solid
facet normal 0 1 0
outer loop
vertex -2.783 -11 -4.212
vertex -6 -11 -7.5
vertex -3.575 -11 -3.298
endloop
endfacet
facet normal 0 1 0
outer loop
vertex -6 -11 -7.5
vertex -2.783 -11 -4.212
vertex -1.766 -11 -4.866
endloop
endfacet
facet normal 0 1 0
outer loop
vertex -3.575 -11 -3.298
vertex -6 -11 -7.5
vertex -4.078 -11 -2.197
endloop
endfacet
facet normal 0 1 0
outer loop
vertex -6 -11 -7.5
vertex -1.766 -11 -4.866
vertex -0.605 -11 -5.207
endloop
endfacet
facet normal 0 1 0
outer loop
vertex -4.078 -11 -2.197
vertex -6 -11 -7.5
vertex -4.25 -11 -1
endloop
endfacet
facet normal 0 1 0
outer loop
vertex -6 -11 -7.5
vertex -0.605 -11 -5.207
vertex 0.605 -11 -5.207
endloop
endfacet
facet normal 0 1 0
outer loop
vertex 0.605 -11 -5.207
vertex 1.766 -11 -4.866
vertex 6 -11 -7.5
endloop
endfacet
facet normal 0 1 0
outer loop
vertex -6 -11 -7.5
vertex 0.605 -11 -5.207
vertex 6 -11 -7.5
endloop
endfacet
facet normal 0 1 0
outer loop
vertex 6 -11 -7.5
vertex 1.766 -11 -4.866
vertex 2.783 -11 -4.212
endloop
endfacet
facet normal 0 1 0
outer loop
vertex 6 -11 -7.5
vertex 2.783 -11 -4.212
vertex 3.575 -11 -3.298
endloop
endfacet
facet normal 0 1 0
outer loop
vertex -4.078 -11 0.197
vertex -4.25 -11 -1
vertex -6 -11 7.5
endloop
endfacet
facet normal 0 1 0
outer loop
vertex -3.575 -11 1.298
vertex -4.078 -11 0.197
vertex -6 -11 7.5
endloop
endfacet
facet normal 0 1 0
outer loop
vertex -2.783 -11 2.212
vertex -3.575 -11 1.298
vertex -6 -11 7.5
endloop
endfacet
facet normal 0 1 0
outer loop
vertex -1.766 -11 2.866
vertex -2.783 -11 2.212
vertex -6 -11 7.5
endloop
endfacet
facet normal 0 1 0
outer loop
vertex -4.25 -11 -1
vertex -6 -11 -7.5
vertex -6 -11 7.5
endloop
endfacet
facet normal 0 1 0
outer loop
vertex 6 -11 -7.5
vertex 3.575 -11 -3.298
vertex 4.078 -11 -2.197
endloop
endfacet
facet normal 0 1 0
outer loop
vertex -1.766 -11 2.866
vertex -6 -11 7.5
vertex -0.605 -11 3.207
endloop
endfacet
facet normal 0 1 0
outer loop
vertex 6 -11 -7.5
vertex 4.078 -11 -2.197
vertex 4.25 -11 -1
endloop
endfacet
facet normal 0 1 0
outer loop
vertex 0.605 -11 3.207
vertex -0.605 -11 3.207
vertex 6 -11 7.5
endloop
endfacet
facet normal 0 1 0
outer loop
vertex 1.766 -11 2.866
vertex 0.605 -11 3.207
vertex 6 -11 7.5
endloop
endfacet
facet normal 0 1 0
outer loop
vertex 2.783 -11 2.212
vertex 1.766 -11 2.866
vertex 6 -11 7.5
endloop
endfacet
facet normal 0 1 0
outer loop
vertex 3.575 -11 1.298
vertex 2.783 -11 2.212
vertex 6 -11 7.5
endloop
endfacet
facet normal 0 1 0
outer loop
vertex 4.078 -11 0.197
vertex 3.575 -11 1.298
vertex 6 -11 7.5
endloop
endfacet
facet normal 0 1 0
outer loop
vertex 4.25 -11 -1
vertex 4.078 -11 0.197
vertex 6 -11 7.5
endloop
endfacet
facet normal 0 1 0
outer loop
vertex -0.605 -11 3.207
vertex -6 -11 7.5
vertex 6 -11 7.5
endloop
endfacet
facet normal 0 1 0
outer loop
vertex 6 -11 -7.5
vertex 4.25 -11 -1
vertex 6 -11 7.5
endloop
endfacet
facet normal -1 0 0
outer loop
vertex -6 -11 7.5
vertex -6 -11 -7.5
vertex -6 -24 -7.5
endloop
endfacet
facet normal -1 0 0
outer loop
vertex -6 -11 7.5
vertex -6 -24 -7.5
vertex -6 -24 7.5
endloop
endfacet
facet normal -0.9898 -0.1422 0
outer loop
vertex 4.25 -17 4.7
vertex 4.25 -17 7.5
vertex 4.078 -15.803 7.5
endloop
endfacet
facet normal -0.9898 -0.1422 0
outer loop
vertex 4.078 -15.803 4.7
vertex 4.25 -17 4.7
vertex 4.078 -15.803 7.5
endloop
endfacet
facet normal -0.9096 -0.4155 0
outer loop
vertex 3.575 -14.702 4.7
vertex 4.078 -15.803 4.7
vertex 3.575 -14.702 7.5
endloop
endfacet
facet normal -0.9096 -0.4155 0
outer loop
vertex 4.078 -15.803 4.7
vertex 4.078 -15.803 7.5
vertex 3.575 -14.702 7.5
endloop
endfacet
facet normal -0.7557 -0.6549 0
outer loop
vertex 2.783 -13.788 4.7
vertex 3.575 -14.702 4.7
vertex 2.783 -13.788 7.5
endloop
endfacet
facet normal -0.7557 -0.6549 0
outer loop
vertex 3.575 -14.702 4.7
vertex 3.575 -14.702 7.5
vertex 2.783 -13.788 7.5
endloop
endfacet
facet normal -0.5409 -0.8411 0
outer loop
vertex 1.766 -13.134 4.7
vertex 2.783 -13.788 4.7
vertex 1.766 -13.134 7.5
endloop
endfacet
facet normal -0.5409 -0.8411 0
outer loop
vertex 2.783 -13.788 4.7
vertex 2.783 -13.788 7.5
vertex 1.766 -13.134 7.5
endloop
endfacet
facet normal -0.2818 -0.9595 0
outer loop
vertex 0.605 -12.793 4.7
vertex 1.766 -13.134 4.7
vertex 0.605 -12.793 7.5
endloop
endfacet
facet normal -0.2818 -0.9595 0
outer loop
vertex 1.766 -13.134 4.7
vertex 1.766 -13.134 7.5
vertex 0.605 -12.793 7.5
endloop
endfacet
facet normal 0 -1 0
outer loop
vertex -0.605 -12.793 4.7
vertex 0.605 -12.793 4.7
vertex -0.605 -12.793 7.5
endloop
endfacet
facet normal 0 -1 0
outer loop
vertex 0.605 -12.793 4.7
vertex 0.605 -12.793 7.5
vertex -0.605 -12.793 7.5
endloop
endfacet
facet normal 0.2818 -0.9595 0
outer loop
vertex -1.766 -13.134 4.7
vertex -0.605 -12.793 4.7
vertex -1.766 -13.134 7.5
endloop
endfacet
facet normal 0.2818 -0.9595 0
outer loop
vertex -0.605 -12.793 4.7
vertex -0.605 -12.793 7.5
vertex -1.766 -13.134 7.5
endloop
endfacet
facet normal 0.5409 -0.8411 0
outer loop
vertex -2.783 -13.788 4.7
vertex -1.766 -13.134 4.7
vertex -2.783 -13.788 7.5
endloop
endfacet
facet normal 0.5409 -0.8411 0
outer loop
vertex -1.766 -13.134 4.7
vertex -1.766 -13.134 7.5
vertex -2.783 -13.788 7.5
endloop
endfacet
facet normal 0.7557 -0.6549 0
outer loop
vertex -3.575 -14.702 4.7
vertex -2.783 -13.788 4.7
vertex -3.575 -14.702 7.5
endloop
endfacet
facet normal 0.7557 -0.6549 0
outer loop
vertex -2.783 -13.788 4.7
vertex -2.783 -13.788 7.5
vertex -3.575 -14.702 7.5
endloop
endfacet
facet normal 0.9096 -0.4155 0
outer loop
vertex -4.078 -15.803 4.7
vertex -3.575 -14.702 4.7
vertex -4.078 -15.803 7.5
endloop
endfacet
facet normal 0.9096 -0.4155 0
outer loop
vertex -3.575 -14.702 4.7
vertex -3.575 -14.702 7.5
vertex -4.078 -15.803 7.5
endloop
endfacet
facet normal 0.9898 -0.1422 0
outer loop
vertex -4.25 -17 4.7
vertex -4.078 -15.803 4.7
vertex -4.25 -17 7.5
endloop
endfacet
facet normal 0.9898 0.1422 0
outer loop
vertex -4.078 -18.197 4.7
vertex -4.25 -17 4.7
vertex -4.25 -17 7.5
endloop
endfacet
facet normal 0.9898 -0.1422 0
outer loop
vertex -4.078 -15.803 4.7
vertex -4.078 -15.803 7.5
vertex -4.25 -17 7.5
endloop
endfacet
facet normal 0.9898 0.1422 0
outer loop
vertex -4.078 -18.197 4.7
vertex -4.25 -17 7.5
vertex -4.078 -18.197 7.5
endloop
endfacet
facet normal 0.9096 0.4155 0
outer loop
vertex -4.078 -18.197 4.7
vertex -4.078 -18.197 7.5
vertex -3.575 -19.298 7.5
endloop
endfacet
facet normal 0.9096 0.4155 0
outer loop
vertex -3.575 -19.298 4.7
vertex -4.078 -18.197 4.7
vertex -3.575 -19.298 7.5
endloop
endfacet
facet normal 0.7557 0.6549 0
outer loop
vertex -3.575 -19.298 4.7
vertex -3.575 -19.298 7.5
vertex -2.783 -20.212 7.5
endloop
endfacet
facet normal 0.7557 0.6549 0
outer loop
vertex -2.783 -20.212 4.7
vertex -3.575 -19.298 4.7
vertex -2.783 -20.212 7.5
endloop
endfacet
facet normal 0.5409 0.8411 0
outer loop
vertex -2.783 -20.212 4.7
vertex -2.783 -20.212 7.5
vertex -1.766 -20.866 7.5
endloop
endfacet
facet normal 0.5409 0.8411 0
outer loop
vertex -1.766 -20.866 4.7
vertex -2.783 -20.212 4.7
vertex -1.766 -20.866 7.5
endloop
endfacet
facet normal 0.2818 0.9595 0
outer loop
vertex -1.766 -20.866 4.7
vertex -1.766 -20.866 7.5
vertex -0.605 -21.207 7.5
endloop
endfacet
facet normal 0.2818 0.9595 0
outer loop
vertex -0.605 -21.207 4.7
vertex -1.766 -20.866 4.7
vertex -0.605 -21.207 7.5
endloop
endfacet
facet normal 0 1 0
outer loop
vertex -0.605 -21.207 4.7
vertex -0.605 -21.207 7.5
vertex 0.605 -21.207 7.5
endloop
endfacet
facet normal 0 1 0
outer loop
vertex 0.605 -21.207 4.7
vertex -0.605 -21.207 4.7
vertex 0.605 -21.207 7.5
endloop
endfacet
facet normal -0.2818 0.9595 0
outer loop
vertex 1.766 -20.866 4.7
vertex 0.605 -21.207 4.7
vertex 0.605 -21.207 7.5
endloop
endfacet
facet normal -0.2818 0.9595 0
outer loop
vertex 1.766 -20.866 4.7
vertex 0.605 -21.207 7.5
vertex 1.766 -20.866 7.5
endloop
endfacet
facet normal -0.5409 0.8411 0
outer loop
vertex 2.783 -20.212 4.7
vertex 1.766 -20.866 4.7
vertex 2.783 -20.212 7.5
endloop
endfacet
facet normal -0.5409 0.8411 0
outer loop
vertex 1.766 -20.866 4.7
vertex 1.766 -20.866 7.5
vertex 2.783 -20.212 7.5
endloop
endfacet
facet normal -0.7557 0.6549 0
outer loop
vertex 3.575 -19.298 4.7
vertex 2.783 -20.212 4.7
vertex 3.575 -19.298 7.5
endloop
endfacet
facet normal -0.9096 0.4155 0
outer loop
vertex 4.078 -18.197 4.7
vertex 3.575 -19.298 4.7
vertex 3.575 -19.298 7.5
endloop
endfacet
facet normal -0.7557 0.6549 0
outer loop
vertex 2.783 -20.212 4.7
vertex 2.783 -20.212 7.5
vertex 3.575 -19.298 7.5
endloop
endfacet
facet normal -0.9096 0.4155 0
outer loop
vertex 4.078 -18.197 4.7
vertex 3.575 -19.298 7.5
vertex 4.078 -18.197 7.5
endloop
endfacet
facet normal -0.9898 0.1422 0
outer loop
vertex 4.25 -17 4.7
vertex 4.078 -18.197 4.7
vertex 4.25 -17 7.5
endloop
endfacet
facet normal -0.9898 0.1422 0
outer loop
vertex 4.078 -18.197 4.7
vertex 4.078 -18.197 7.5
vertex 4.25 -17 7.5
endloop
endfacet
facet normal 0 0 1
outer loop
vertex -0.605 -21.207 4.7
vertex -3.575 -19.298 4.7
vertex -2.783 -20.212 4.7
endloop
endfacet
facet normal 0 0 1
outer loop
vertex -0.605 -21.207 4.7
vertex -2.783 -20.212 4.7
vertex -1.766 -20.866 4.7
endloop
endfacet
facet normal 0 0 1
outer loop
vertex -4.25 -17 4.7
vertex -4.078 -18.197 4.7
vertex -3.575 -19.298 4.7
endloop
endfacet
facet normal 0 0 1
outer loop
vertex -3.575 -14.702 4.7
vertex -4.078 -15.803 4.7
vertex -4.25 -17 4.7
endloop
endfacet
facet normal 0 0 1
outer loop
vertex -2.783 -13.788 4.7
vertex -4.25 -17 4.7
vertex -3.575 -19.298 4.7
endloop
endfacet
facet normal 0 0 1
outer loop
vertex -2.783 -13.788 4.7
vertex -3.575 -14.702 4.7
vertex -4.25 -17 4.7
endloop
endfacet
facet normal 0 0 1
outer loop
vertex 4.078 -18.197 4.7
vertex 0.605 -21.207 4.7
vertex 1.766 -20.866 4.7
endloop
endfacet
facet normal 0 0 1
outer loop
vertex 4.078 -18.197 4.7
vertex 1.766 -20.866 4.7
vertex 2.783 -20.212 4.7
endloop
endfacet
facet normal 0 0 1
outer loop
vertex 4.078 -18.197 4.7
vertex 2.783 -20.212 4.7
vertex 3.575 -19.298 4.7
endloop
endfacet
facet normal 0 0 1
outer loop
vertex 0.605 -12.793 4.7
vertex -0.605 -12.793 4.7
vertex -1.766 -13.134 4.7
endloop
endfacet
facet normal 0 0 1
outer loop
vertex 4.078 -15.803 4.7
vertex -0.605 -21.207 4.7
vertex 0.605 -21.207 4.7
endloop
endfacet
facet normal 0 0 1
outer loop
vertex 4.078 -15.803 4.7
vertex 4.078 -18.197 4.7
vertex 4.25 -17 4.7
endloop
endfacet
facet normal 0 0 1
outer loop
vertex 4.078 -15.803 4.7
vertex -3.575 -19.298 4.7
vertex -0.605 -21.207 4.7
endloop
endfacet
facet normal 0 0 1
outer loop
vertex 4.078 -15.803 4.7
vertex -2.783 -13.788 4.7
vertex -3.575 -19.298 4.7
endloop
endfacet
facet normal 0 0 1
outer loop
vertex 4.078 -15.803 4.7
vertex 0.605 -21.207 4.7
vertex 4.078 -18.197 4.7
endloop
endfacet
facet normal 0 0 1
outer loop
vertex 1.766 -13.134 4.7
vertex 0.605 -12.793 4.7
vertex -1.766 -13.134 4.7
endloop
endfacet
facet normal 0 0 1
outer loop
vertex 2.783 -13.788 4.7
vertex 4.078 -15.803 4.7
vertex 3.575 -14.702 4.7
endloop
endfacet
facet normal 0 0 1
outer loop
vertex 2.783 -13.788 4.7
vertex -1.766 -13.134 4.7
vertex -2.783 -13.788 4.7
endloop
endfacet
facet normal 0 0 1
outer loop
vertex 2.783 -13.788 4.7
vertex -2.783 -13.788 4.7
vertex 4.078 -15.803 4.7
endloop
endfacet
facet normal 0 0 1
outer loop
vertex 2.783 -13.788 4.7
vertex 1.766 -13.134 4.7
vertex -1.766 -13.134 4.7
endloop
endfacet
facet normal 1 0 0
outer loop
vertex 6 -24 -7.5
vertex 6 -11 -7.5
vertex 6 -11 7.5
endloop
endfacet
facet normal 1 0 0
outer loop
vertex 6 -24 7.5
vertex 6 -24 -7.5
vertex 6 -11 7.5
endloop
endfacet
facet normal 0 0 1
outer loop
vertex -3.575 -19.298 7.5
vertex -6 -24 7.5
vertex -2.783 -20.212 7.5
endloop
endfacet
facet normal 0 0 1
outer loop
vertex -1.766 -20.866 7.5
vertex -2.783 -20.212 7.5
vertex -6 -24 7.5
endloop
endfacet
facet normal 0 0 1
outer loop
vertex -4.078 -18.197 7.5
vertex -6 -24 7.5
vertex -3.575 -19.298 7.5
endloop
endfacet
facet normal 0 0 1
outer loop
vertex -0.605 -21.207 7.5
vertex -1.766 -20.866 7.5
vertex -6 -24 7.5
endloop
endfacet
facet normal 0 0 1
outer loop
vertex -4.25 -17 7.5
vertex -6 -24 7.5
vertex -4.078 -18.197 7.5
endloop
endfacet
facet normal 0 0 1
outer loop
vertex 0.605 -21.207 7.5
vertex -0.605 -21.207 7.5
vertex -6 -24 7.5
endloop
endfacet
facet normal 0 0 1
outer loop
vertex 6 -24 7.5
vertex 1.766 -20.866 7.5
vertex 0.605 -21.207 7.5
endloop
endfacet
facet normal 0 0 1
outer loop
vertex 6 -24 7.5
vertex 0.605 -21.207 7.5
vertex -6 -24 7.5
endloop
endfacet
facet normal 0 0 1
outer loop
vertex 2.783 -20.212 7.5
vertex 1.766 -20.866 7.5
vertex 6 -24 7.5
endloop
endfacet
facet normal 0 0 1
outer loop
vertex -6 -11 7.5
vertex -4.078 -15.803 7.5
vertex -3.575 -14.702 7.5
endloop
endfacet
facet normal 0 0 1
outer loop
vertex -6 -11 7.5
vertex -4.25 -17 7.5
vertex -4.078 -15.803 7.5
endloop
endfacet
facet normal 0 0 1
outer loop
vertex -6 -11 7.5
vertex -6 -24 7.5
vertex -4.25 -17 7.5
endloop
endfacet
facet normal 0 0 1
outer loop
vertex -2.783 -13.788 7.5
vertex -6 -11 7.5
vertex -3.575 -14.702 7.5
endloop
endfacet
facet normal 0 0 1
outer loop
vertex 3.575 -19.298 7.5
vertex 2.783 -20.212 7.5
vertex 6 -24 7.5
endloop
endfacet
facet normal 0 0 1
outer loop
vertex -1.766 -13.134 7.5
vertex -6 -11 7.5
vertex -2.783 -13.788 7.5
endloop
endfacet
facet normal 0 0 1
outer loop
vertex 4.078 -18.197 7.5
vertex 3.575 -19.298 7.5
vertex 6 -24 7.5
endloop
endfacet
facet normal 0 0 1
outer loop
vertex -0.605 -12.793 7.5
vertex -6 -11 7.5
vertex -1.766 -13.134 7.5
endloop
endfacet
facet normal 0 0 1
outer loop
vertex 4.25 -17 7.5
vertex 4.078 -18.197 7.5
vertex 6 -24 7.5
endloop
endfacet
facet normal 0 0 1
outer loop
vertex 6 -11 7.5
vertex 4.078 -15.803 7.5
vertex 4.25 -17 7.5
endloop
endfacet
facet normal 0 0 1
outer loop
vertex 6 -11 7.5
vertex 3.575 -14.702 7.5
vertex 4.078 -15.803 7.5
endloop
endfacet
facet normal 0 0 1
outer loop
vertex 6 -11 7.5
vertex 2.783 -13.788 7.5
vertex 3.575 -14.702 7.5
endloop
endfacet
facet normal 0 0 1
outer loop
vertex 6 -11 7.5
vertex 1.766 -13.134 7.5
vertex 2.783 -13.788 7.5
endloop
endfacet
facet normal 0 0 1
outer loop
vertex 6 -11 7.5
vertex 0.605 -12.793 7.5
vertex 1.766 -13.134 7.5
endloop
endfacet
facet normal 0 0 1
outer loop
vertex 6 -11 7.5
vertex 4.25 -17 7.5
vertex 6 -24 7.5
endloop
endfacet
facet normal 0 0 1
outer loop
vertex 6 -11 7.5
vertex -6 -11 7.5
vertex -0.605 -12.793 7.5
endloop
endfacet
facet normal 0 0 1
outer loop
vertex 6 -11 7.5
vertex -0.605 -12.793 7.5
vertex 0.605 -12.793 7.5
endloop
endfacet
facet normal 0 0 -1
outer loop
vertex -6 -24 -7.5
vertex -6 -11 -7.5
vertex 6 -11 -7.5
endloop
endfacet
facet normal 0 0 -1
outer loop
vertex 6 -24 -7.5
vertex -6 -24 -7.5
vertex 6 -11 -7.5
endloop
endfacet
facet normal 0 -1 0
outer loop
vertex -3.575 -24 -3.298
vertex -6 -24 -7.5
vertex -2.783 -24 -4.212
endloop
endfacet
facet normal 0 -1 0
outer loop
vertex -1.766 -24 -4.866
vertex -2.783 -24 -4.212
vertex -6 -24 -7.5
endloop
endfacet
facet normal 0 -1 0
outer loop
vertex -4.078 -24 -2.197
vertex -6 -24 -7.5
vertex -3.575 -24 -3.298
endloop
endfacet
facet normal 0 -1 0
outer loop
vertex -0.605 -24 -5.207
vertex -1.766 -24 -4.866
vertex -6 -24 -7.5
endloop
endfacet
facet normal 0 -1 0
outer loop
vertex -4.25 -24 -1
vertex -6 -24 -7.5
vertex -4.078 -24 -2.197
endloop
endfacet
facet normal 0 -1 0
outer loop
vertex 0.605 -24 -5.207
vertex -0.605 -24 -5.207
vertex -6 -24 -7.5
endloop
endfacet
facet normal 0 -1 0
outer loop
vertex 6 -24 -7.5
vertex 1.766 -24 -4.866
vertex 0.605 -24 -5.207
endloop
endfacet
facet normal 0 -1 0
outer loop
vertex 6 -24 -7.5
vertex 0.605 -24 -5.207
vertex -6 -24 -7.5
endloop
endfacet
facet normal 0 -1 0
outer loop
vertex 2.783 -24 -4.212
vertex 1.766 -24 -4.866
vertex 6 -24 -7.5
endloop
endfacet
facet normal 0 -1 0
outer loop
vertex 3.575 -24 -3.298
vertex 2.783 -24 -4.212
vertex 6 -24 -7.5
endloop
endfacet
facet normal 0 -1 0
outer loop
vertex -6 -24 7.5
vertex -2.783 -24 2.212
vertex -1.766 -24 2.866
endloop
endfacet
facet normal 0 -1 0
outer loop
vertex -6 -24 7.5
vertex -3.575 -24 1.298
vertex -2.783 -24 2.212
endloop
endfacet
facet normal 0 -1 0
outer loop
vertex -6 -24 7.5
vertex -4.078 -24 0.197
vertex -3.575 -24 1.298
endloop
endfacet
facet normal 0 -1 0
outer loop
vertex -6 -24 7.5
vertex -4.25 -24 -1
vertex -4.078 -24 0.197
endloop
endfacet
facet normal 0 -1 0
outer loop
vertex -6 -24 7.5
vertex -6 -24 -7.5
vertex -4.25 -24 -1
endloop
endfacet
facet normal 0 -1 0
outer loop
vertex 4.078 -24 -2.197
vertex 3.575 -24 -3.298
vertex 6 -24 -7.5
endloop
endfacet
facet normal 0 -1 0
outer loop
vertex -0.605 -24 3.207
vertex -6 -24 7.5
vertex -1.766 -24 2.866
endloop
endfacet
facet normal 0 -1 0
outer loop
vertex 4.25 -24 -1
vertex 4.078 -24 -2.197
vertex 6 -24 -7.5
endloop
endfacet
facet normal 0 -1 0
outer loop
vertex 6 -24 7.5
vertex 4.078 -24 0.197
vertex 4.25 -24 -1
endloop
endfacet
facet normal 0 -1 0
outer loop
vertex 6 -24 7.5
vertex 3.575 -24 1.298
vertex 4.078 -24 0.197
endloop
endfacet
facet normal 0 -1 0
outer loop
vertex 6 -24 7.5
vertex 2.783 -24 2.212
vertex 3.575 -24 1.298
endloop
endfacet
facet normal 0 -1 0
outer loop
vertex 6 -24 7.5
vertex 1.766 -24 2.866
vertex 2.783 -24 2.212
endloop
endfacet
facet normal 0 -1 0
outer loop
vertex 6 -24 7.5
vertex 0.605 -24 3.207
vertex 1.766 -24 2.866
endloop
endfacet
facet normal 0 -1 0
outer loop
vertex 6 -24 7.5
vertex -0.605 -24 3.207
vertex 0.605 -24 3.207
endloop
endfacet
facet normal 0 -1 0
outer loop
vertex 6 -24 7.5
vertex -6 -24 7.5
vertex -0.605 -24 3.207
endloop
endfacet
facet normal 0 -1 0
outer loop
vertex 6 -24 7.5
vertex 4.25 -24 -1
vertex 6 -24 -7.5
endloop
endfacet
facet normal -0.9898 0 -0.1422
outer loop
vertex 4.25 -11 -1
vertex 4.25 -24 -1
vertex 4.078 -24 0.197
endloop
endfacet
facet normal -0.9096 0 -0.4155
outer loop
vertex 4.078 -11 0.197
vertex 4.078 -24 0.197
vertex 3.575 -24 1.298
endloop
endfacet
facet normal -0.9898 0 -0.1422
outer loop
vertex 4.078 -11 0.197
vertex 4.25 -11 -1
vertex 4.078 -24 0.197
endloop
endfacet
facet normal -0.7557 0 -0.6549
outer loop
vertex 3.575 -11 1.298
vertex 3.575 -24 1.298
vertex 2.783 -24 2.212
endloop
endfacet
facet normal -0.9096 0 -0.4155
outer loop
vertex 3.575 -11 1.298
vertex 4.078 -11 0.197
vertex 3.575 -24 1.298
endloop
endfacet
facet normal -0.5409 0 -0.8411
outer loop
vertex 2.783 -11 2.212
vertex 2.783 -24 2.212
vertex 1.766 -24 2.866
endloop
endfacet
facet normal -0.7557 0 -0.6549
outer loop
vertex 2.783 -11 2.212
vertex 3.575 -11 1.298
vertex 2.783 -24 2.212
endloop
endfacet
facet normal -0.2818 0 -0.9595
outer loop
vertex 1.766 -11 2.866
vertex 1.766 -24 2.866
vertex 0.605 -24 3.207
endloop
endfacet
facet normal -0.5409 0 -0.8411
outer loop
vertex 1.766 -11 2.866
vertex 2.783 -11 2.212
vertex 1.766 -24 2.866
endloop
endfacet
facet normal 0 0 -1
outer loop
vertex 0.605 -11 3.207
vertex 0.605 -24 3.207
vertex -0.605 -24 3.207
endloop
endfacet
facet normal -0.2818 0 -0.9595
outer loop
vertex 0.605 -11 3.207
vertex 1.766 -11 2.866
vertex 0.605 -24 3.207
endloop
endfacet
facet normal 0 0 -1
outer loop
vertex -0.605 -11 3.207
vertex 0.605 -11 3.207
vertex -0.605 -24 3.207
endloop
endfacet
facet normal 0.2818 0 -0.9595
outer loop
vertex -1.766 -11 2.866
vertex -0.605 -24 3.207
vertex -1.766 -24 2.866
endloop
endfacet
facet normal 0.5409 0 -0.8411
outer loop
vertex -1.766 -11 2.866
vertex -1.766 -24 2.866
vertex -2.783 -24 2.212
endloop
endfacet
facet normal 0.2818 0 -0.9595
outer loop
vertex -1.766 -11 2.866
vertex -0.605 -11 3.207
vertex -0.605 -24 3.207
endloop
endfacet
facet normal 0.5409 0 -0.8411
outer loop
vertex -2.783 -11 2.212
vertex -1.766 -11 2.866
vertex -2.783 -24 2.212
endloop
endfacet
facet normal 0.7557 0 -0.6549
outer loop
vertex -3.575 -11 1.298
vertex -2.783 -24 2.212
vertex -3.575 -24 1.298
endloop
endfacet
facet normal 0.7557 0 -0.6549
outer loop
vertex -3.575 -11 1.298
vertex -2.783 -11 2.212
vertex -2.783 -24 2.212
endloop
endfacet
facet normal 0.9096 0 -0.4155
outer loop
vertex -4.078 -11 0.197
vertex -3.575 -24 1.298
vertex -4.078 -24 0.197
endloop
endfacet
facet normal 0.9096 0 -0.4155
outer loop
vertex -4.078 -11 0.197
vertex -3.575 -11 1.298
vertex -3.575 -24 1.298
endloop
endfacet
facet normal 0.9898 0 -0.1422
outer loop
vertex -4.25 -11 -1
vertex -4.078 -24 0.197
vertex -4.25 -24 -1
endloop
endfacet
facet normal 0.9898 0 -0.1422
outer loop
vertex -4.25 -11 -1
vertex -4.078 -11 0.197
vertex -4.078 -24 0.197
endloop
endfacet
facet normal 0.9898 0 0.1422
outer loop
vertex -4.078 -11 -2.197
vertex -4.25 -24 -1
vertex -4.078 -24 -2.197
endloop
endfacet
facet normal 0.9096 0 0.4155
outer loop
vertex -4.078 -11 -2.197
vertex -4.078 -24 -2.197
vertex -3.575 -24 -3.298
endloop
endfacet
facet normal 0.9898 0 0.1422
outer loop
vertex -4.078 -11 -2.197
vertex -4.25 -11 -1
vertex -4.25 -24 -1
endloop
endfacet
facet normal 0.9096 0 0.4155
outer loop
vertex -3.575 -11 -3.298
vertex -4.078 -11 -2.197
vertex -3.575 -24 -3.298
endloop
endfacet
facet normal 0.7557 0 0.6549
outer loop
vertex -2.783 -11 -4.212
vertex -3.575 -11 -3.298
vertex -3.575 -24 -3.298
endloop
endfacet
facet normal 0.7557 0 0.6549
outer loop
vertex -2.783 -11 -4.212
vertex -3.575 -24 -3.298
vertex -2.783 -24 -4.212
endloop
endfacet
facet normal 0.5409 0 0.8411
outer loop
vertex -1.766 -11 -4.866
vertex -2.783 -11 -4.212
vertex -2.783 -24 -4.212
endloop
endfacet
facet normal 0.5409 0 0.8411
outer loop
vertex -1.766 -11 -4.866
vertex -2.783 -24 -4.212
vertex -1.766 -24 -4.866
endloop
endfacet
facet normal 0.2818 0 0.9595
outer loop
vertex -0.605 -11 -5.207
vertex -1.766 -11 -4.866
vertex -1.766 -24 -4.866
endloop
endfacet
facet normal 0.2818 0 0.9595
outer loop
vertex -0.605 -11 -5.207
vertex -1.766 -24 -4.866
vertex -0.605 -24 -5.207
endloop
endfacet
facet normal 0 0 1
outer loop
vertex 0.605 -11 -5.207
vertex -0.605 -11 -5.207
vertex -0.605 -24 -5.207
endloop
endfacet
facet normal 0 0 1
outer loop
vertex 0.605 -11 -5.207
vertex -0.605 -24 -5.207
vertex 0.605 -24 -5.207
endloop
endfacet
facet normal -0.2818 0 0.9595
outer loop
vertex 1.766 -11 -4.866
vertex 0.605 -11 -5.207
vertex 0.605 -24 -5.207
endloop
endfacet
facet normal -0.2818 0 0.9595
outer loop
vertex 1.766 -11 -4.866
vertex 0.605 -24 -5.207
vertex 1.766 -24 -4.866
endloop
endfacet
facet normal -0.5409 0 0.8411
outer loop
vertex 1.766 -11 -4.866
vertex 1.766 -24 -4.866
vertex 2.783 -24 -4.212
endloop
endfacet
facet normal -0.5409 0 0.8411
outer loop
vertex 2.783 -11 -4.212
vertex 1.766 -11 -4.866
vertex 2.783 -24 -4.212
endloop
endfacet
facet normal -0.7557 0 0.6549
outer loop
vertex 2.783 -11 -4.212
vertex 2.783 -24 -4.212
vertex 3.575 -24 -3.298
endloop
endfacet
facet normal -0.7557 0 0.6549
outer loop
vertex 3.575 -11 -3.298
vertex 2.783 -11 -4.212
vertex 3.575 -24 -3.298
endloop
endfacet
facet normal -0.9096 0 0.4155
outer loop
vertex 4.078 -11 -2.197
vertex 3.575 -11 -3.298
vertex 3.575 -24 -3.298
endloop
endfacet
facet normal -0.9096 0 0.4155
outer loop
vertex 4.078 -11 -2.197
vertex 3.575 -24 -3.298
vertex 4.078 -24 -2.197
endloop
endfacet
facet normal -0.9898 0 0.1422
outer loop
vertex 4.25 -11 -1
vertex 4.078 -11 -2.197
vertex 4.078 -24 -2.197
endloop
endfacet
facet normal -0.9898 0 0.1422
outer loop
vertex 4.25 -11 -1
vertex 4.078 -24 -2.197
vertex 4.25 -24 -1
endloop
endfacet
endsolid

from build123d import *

# Parameters (mm, degrees)
F0_W     = 12
F0_H     = 15
F0_R     = 4.25
F1_DEPTH = 24
F2_R     = 4.125
F2_R_2   = 4.25
F3_DEPTH = 2.8
F5_W     = 22.825278
F5_H     = 44.441271
F6_DEPTH = 25


with BuildPart() as f1:
    # F0 (on Front) → F1 (new body)
    with BuildSketch(Plane.XZ):
        Rectangle(F0_W, F0_H)
        with Locations((0, -1)):
            Circle(F0_R, mode=Mode.SUBTRACT)
    extrude(amount=F1_DEPTH)

    # F2 (on face) → F3 (cut)
    with BuildSketch(Plane.XY.offset(7.5)):
        with Locations((0, -6)):
            Circle(F2_R)
        with Locations((0, -17)):
            Circle(F2_R_2)
    extrude(amount=-F3_DEPTH, mode=Mode.SUBTRACT)

    # F5 (on offset) → F6 (cut)
    with BuildSketch(Plane.XZ.offset(11)):
        with Locations((0.147067, 4.025047)):
            Rectangle(F5_W, F5_H)
    extrude(amount=-F6_DEPTH, mode=Mode.SUBTRACT)


solid = f1.part
